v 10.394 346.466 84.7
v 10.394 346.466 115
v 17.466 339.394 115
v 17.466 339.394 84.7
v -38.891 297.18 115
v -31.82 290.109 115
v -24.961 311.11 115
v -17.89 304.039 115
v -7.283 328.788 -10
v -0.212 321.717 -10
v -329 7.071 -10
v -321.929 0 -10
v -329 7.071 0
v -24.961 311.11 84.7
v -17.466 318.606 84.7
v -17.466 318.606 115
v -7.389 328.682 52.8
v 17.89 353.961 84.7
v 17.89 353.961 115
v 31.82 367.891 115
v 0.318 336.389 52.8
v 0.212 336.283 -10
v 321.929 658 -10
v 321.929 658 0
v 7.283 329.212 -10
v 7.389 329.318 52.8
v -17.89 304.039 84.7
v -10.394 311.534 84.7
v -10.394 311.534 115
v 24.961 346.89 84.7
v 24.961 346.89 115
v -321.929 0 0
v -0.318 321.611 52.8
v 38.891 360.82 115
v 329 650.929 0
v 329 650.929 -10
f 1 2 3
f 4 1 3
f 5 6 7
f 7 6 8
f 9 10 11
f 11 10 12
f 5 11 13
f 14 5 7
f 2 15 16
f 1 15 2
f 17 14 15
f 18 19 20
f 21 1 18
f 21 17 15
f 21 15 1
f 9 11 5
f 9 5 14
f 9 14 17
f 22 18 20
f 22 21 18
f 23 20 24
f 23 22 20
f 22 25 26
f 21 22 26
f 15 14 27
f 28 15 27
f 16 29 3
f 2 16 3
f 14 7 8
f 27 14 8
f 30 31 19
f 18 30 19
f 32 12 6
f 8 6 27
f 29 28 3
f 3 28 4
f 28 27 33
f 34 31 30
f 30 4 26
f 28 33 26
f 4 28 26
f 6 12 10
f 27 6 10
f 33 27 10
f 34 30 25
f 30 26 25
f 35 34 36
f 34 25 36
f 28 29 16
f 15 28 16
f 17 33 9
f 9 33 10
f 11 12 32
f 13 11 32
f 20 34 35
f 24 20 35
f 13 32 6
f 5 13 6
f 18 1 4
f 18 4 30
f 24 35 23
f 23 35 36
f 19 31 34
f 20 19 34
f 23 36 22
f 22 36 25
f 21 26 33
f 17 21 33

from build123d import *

# Parameters (mm, degrees)
BOSS_EXTRUDE1_DEPTH      = 5
BOSS_EXTRUDE1_DEPTH_BACK = 5
BODY_MOVE_COPY1_ANGLE    = 90
CUT_EXTRUDE2_DEPTH       = 708.325596879
CUT_EXTRUDE2_DEPTH_BACK  = 708.325596879
CUT_EXTRUDE3_DEPTH       = 30.3


with BuildPart() as part:
    # Sketch1 → Boss-Extrude1 (new, two sides: drawn at the far end of the back side and taken through both)
    with BuildSketch(Plane(origin=(164.5, 164.5, 0), x_dir=(-0.7071067811865478, 0.7071067811865475, 0), z_dir=(-0.7071067811865475, -0.7071067811865478, 0)).offset(-BOSS_EXTRUDE1_DEPTH_BACK)):
        Polygon((182.63813101, -115), (282.63813101, -115), (692.914393031, 0), (692.914393031, 10), (-227.63813101, 10), (-227.63813101, 0), align=None)
    extrude(amount=BOSS_EXTRUDE1_DEPTH + BOSS_EXTRUDE1_DEPTH_BACK)


with BuildPart() as part_1:
    # Body-Move/Copy1: moved
    add(part.part.moved(Location((0, 0, 0))).rotate(Axis((0, 329, 0), (0, 0, -1)), BODY_MOVE_COPY1_ANGLE))

    # Sketch2 → Cut-Extrude2 (cut, two sides: drawn at the far end of the back side and taken through both)
    with BuildSketch(Plane(origin=(-164.5, 164.5, 0), x_dir=(0.6804138174397739, 0.6804138174397697, 0.27216552697590835), z_dir=(-0.7071067811865454, 0.7071067811865498, 0)).offset(-CUT_EXTRUDE2_DEPTH_BACK)):
        Polygon((216.03456329, 71.496106715), (226.234418046, 74.381061301), (243.470750707, 13.992557954), (232.982220817, 11.02595371), align=None)
    extrude(amount=CUT_EXTRUDE2_DEPTH + CUT_EXTRUDE2_DEPTH_BACK, mode=Mode.SUBTRACT)

    # Sketch3 → Cut-Extrude3 (cut)
    with BuildSketch(Plane.XY.offset(115)):
        Polygon((-24.960869376, 311.110198436), (-17.889801564, 304.039130624), (-10.394469683, 311.534462505), (-17.465537495, 318.605530317), align=None)
        Polygon((10.394469683, 346.465537495), (17.465537495, 339.394469683), (24.960869376, 346.889801564), (17.889801564, 353.960869376), align=None)
    extrude(amount=-CUT_EXTRUDE3_DEPTH, mode=Mode.SUBTRACT)


solid = part_1.part
